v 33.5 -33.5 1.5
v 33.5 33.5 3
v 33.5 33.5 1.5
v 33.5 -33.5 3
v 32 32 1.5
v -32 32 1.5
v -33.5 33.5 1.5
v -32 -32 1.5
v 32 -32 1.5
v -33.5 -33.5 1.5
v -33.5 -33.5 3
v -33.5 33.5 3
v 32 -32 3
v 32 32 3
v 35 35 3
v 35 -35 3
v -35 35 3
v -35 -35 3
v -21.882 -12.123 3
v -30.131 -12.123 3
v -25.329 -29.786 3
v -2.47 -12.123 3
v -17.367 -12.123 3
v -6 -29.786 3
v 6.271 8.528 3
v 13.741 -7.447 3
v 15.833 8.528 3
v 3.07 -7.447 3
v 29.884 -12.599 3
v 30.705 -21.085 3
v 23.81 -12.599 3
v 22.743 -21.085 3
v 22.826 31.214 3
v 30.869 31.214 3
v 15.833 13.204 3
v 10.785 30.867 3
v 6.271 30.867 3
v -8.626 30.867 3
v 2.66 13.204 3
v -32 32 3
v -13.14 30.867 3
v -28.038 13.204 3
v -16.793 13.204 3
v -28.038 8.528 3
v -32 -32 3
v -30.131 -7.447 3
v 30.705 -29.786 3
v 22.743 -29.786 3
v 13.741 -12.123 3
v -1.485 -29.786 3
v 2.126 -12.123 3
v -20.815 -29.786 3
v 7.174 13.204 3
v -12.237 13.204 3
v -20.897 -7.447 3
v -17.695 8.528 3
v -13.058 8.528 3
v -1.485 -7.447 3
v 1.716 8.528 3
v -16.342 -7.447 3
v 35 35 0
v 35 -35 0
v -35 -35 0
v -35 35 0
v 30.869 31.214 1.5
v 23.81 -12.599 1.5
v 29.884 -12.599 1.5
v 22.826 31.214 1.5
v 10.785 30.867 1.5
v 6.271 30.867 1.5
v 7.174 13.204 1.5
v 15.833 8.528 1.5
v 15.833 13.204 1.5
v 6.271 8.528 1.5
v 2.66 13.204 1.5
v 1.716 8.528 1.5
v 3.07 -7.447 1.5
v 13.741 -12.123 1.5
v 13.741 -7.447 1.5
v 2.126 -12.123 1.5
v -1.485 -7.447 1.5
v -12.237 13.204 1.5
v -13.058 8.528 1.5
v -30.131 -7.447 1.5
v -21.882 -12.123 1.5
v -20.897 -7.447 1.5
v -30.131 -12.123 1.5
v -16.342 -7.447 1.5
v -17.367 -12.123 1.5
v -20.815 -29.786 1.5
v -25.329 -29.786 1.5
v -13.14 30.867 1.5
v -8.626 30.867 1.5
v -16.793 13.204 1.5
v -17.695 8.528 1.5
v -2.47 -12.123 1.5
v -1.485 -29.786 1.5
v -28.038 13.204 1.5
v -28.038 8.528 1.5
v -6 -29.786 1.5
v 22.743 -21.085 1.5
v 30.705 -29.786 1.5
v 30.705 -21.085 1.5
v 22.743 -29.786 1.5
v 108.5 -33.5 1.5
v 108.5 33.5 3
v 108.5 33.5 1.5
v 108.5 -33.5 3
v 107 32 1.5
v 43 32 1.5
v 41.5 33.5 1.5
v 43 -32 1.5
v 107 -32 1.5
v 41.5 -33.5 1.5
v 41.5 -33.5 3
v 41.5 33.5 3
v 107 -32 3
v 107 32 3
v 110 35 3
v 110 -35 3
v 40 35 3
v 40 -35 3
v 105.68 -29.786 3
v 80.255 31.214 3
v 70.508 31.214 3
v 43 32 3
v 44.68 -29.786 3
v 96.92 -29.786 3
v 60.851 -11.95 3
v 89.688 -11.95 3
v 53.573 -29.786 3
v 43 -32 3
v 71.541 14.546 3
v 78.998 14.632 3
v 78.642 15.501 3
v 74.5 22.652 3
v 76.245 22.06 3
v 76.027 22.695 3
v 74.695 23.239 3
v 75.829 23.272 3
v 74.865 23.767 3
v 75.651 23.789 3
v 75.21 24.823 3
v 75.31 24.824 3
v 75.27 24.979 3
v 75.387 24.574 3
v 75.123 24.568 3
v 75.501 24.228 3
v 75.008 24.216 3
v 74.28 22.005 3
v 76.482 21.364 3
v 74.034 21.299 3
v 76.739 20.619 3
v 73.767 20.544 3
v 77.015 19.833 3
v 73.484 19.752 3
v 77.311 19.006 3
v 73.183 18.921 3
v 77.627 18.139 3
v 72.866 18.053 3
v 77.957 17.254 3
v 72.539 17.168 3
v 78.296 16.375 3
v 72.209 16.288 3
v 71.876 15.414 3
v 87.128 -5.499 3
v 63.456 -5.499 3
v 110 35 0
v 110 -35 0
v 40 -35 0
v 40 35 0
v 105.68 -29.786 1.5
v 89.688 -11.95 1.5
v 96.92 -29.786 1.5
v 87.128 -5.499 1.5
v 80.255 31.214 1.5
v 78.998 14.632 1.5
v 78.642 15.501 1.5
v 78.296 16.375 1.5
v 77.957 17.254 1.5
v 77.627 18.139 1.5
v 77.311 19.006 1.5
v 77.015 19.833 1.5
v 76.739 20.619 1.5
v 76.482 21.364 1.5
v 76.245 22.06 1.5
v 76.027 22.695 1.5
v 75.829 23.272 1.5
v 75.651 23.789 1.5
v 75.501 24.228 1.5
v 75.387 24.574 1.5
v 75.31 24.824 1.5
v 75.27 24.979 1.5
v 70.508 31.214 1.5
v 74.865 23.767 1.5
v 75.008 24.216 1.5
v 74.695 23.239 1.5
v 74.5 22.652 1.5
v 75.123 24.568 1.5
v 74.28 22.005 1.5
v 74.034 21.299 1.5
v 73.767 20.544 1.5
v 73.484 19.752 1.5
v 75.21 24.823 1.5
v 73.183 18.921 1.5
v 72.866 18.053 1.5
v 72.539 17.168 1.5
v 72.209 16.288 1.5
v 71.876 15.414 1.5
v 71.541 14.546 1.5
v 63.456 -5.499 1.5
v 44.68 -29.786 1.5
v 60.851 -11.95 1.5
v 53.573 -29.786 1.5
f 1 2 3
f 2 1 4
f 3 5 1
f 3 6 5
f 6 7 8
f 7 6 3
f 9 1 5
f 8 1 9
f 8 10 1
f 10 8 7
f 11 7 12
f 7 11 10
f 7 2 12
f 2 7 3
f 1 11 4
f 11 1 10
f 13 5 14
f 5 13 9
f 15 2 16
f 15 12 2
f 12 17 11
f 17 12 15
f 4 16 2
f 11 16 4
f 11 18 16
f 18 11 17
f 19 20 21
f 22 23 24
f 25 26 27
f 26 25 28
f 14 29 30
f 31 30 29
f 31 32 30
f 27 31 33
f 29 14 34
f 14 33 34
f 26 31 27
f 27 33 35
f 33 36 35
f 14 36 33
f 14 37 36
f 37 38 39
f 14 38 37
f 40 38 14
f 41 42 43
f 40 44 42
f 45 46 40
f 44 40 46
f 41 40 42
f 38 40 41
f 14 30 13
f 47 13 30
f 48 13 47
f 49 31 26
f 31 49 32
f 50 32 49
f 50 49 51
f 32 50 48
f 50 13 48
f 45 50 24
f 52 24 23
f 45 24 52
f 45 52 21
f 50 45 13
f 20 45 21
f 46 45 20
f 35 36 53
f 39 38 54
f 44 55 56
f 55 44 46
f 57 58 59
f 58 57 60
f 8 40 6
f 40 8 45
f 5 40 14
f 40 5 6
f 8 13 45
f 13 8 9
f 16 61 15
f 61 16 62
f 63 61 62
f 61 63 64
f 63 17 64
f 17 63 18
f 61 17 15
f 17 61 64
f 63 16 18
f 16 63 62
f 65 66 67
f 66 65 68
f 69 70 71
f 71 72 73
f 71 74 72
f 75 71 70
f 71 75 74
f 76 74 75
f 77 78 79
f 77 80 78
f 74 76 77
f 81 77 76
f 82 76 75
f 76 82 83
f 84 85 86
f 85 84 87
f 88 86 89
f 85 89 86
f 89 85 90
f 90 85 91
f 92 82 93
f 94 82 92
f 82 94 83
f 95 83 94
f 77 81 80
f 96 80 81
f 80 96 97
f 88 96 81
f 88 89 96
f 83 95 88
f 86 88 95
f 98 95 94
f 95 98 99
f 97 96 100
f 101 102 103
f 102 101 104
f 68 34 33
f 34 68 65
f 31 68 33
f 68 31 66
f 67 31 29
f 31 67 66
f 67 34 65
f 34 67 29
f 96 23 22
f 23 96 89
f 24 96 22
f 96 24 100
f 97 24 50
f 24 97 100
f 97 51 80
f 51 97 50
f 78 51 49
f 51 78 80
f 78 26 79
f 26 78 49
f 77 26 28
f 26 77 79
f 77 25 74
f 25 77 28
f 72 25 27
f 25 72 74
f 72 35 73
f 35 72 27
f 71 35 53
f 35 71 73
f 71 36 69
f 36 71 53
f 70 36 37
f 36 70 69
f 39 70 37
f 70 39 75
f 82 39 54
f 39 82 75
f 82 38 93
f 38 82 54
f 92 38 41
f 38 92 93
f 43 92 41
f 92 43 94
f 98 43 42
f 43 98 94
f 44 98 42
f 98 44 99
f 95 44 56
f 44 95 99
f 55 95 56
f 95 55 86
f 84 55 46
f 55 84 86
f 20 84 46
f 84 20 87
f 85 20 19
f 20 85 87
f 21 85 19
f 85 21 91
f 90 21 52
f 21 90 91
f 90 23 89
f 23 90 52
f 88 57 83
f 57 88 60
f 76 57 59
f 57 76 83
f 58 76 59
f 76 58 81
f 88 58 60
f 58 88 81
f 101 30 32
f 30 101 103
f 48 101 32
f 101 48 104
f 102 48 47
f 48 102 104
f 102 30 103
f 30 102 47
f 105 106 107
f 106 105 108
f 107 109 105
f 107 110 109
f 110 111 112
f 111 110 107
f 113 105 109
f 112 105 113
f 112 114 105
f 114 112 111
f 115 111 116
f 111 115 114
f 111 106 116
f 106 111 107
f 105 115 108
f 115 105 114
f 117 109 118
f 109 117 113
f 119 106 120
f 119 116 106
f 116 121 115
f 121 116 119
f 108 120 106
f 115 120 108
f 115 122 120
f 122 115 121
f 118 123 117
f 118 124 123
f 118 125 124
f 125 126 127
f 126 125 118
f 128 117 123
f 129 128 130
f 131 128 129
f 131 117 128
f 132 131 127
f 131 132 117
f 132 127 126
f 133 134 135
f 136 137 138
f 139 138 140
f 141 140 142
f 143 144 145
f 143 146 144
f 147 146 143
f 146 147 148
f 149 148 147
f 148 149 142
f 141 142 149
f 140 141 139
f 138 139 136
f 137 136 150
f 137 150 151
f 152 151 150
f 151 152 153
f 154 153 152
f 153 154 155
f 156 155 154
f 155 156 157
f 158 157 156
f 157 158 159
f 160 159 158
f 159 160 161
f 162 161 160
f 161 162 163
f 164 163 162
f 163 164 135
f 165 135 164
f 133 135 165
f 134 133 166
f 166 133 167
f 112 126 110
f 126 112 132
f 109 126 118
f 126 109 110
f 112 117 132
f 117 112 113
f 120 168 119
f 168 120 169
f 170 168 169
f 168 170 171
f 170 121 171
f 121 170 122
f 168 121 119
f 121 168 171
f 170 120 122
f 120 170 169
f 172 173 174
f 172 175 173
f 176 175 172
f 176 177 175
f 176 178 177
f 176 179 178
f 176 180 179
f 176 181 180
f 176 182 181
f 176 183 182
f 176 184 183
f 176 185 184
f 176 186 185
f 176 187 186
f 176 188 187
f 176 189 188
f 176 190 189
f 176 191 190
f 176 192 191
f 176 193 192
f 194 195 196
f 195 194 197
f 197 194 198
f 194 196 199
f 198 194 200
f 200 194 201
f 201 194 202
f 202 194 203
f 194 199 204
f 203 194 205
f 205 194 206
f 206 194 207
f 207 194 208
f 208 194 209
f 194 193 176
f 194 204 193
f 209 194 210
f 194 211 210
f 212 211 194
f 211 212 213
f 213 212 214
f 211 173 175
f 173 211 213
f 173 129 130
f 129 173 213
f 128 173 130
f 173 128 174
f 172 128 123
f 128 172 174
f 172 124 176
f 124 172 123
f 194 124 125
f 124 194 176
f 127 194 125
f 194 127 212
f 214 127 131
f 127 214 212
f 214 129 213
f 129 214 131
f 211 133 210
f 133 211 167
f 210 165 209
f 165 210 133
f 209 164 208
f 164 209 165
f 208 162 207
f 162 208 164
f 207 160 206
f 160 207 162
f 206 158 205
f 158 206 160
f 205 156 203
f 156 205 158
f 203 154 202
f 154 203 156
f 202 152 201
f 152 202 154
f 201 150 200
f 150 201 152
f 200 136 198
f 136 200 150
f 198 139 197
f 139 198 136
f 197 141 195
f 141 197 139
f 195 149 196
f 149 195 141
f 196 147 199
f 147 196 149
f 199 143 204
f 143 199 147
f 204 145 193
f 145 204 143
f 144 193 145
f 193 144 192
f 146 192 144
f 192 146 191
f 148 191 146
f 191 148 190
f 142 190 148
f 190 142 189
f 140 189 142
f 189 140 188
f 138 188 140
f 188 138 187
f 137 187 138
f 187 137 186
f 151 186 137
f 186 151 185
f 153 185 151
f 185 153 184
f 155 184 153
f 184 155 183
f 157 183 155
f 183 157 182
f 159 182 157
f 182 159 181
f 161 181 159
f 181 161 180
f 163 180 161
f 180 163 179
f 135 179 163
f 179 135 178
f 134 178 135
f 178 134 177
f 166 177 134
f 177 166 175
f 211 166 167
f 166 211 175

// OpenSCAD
DEFAULT_FONT = "Roboto";
//DEFAULT_FONT = "Helvetica";

DEFAULT_TEXT_COASTER_SIZE = [70, 70, 3];

module centeredText(text, area, font)
{
    length = area[0];
    height = area[1];
    depth  = area[2];

    translate([(length / -2), 0, (depth / -2)])
    linear_extrude(depth)
    resize([length, height], auto = true)
    text(text, font, valign = "center");
}

module TextCoaster(text,
    boxSize=DEFAULT_TEXT_COASTER_SIZE,
    font=DEFAULT_FONT)
{
    MARGIN_WIDTH = boxSize[2] / 2;

    MARGIN_DEPTH = boxSize[2] / 2;
    TEXT_DEPTH = boxSize[2] / 2;

    translate([0, 0, boxSize[2] / 2])
    difference()
    {
        // Main shape
        cube(boxSize, center=true);

        // Margins
        difference()
        {
            translate([0, 0, boxSize[2] - MARGIN_DEPTH])
            cube(boxSize - [MARGIN_WIDTH*2, MARGIN_WIDTH*2, 0], center=true);

            cube(boxSize - [MARGIN_WIDTH*4, MARGIN_WIDTH*4, 0], center=true);
        }

        // Text
        textArea = boxSize - [MARGIN_WIDTH*6, MARGIN_WIDTH*6, 0];
        translate([0, 0,  boxSize[2] - TEXT_DEPTH])
        centeredText(text, textArea, font);
    }
}

translate([ 0, 0, 0]) TextCoaster("#!");
translate([75, 0, 0]) TextCoaster("A");
